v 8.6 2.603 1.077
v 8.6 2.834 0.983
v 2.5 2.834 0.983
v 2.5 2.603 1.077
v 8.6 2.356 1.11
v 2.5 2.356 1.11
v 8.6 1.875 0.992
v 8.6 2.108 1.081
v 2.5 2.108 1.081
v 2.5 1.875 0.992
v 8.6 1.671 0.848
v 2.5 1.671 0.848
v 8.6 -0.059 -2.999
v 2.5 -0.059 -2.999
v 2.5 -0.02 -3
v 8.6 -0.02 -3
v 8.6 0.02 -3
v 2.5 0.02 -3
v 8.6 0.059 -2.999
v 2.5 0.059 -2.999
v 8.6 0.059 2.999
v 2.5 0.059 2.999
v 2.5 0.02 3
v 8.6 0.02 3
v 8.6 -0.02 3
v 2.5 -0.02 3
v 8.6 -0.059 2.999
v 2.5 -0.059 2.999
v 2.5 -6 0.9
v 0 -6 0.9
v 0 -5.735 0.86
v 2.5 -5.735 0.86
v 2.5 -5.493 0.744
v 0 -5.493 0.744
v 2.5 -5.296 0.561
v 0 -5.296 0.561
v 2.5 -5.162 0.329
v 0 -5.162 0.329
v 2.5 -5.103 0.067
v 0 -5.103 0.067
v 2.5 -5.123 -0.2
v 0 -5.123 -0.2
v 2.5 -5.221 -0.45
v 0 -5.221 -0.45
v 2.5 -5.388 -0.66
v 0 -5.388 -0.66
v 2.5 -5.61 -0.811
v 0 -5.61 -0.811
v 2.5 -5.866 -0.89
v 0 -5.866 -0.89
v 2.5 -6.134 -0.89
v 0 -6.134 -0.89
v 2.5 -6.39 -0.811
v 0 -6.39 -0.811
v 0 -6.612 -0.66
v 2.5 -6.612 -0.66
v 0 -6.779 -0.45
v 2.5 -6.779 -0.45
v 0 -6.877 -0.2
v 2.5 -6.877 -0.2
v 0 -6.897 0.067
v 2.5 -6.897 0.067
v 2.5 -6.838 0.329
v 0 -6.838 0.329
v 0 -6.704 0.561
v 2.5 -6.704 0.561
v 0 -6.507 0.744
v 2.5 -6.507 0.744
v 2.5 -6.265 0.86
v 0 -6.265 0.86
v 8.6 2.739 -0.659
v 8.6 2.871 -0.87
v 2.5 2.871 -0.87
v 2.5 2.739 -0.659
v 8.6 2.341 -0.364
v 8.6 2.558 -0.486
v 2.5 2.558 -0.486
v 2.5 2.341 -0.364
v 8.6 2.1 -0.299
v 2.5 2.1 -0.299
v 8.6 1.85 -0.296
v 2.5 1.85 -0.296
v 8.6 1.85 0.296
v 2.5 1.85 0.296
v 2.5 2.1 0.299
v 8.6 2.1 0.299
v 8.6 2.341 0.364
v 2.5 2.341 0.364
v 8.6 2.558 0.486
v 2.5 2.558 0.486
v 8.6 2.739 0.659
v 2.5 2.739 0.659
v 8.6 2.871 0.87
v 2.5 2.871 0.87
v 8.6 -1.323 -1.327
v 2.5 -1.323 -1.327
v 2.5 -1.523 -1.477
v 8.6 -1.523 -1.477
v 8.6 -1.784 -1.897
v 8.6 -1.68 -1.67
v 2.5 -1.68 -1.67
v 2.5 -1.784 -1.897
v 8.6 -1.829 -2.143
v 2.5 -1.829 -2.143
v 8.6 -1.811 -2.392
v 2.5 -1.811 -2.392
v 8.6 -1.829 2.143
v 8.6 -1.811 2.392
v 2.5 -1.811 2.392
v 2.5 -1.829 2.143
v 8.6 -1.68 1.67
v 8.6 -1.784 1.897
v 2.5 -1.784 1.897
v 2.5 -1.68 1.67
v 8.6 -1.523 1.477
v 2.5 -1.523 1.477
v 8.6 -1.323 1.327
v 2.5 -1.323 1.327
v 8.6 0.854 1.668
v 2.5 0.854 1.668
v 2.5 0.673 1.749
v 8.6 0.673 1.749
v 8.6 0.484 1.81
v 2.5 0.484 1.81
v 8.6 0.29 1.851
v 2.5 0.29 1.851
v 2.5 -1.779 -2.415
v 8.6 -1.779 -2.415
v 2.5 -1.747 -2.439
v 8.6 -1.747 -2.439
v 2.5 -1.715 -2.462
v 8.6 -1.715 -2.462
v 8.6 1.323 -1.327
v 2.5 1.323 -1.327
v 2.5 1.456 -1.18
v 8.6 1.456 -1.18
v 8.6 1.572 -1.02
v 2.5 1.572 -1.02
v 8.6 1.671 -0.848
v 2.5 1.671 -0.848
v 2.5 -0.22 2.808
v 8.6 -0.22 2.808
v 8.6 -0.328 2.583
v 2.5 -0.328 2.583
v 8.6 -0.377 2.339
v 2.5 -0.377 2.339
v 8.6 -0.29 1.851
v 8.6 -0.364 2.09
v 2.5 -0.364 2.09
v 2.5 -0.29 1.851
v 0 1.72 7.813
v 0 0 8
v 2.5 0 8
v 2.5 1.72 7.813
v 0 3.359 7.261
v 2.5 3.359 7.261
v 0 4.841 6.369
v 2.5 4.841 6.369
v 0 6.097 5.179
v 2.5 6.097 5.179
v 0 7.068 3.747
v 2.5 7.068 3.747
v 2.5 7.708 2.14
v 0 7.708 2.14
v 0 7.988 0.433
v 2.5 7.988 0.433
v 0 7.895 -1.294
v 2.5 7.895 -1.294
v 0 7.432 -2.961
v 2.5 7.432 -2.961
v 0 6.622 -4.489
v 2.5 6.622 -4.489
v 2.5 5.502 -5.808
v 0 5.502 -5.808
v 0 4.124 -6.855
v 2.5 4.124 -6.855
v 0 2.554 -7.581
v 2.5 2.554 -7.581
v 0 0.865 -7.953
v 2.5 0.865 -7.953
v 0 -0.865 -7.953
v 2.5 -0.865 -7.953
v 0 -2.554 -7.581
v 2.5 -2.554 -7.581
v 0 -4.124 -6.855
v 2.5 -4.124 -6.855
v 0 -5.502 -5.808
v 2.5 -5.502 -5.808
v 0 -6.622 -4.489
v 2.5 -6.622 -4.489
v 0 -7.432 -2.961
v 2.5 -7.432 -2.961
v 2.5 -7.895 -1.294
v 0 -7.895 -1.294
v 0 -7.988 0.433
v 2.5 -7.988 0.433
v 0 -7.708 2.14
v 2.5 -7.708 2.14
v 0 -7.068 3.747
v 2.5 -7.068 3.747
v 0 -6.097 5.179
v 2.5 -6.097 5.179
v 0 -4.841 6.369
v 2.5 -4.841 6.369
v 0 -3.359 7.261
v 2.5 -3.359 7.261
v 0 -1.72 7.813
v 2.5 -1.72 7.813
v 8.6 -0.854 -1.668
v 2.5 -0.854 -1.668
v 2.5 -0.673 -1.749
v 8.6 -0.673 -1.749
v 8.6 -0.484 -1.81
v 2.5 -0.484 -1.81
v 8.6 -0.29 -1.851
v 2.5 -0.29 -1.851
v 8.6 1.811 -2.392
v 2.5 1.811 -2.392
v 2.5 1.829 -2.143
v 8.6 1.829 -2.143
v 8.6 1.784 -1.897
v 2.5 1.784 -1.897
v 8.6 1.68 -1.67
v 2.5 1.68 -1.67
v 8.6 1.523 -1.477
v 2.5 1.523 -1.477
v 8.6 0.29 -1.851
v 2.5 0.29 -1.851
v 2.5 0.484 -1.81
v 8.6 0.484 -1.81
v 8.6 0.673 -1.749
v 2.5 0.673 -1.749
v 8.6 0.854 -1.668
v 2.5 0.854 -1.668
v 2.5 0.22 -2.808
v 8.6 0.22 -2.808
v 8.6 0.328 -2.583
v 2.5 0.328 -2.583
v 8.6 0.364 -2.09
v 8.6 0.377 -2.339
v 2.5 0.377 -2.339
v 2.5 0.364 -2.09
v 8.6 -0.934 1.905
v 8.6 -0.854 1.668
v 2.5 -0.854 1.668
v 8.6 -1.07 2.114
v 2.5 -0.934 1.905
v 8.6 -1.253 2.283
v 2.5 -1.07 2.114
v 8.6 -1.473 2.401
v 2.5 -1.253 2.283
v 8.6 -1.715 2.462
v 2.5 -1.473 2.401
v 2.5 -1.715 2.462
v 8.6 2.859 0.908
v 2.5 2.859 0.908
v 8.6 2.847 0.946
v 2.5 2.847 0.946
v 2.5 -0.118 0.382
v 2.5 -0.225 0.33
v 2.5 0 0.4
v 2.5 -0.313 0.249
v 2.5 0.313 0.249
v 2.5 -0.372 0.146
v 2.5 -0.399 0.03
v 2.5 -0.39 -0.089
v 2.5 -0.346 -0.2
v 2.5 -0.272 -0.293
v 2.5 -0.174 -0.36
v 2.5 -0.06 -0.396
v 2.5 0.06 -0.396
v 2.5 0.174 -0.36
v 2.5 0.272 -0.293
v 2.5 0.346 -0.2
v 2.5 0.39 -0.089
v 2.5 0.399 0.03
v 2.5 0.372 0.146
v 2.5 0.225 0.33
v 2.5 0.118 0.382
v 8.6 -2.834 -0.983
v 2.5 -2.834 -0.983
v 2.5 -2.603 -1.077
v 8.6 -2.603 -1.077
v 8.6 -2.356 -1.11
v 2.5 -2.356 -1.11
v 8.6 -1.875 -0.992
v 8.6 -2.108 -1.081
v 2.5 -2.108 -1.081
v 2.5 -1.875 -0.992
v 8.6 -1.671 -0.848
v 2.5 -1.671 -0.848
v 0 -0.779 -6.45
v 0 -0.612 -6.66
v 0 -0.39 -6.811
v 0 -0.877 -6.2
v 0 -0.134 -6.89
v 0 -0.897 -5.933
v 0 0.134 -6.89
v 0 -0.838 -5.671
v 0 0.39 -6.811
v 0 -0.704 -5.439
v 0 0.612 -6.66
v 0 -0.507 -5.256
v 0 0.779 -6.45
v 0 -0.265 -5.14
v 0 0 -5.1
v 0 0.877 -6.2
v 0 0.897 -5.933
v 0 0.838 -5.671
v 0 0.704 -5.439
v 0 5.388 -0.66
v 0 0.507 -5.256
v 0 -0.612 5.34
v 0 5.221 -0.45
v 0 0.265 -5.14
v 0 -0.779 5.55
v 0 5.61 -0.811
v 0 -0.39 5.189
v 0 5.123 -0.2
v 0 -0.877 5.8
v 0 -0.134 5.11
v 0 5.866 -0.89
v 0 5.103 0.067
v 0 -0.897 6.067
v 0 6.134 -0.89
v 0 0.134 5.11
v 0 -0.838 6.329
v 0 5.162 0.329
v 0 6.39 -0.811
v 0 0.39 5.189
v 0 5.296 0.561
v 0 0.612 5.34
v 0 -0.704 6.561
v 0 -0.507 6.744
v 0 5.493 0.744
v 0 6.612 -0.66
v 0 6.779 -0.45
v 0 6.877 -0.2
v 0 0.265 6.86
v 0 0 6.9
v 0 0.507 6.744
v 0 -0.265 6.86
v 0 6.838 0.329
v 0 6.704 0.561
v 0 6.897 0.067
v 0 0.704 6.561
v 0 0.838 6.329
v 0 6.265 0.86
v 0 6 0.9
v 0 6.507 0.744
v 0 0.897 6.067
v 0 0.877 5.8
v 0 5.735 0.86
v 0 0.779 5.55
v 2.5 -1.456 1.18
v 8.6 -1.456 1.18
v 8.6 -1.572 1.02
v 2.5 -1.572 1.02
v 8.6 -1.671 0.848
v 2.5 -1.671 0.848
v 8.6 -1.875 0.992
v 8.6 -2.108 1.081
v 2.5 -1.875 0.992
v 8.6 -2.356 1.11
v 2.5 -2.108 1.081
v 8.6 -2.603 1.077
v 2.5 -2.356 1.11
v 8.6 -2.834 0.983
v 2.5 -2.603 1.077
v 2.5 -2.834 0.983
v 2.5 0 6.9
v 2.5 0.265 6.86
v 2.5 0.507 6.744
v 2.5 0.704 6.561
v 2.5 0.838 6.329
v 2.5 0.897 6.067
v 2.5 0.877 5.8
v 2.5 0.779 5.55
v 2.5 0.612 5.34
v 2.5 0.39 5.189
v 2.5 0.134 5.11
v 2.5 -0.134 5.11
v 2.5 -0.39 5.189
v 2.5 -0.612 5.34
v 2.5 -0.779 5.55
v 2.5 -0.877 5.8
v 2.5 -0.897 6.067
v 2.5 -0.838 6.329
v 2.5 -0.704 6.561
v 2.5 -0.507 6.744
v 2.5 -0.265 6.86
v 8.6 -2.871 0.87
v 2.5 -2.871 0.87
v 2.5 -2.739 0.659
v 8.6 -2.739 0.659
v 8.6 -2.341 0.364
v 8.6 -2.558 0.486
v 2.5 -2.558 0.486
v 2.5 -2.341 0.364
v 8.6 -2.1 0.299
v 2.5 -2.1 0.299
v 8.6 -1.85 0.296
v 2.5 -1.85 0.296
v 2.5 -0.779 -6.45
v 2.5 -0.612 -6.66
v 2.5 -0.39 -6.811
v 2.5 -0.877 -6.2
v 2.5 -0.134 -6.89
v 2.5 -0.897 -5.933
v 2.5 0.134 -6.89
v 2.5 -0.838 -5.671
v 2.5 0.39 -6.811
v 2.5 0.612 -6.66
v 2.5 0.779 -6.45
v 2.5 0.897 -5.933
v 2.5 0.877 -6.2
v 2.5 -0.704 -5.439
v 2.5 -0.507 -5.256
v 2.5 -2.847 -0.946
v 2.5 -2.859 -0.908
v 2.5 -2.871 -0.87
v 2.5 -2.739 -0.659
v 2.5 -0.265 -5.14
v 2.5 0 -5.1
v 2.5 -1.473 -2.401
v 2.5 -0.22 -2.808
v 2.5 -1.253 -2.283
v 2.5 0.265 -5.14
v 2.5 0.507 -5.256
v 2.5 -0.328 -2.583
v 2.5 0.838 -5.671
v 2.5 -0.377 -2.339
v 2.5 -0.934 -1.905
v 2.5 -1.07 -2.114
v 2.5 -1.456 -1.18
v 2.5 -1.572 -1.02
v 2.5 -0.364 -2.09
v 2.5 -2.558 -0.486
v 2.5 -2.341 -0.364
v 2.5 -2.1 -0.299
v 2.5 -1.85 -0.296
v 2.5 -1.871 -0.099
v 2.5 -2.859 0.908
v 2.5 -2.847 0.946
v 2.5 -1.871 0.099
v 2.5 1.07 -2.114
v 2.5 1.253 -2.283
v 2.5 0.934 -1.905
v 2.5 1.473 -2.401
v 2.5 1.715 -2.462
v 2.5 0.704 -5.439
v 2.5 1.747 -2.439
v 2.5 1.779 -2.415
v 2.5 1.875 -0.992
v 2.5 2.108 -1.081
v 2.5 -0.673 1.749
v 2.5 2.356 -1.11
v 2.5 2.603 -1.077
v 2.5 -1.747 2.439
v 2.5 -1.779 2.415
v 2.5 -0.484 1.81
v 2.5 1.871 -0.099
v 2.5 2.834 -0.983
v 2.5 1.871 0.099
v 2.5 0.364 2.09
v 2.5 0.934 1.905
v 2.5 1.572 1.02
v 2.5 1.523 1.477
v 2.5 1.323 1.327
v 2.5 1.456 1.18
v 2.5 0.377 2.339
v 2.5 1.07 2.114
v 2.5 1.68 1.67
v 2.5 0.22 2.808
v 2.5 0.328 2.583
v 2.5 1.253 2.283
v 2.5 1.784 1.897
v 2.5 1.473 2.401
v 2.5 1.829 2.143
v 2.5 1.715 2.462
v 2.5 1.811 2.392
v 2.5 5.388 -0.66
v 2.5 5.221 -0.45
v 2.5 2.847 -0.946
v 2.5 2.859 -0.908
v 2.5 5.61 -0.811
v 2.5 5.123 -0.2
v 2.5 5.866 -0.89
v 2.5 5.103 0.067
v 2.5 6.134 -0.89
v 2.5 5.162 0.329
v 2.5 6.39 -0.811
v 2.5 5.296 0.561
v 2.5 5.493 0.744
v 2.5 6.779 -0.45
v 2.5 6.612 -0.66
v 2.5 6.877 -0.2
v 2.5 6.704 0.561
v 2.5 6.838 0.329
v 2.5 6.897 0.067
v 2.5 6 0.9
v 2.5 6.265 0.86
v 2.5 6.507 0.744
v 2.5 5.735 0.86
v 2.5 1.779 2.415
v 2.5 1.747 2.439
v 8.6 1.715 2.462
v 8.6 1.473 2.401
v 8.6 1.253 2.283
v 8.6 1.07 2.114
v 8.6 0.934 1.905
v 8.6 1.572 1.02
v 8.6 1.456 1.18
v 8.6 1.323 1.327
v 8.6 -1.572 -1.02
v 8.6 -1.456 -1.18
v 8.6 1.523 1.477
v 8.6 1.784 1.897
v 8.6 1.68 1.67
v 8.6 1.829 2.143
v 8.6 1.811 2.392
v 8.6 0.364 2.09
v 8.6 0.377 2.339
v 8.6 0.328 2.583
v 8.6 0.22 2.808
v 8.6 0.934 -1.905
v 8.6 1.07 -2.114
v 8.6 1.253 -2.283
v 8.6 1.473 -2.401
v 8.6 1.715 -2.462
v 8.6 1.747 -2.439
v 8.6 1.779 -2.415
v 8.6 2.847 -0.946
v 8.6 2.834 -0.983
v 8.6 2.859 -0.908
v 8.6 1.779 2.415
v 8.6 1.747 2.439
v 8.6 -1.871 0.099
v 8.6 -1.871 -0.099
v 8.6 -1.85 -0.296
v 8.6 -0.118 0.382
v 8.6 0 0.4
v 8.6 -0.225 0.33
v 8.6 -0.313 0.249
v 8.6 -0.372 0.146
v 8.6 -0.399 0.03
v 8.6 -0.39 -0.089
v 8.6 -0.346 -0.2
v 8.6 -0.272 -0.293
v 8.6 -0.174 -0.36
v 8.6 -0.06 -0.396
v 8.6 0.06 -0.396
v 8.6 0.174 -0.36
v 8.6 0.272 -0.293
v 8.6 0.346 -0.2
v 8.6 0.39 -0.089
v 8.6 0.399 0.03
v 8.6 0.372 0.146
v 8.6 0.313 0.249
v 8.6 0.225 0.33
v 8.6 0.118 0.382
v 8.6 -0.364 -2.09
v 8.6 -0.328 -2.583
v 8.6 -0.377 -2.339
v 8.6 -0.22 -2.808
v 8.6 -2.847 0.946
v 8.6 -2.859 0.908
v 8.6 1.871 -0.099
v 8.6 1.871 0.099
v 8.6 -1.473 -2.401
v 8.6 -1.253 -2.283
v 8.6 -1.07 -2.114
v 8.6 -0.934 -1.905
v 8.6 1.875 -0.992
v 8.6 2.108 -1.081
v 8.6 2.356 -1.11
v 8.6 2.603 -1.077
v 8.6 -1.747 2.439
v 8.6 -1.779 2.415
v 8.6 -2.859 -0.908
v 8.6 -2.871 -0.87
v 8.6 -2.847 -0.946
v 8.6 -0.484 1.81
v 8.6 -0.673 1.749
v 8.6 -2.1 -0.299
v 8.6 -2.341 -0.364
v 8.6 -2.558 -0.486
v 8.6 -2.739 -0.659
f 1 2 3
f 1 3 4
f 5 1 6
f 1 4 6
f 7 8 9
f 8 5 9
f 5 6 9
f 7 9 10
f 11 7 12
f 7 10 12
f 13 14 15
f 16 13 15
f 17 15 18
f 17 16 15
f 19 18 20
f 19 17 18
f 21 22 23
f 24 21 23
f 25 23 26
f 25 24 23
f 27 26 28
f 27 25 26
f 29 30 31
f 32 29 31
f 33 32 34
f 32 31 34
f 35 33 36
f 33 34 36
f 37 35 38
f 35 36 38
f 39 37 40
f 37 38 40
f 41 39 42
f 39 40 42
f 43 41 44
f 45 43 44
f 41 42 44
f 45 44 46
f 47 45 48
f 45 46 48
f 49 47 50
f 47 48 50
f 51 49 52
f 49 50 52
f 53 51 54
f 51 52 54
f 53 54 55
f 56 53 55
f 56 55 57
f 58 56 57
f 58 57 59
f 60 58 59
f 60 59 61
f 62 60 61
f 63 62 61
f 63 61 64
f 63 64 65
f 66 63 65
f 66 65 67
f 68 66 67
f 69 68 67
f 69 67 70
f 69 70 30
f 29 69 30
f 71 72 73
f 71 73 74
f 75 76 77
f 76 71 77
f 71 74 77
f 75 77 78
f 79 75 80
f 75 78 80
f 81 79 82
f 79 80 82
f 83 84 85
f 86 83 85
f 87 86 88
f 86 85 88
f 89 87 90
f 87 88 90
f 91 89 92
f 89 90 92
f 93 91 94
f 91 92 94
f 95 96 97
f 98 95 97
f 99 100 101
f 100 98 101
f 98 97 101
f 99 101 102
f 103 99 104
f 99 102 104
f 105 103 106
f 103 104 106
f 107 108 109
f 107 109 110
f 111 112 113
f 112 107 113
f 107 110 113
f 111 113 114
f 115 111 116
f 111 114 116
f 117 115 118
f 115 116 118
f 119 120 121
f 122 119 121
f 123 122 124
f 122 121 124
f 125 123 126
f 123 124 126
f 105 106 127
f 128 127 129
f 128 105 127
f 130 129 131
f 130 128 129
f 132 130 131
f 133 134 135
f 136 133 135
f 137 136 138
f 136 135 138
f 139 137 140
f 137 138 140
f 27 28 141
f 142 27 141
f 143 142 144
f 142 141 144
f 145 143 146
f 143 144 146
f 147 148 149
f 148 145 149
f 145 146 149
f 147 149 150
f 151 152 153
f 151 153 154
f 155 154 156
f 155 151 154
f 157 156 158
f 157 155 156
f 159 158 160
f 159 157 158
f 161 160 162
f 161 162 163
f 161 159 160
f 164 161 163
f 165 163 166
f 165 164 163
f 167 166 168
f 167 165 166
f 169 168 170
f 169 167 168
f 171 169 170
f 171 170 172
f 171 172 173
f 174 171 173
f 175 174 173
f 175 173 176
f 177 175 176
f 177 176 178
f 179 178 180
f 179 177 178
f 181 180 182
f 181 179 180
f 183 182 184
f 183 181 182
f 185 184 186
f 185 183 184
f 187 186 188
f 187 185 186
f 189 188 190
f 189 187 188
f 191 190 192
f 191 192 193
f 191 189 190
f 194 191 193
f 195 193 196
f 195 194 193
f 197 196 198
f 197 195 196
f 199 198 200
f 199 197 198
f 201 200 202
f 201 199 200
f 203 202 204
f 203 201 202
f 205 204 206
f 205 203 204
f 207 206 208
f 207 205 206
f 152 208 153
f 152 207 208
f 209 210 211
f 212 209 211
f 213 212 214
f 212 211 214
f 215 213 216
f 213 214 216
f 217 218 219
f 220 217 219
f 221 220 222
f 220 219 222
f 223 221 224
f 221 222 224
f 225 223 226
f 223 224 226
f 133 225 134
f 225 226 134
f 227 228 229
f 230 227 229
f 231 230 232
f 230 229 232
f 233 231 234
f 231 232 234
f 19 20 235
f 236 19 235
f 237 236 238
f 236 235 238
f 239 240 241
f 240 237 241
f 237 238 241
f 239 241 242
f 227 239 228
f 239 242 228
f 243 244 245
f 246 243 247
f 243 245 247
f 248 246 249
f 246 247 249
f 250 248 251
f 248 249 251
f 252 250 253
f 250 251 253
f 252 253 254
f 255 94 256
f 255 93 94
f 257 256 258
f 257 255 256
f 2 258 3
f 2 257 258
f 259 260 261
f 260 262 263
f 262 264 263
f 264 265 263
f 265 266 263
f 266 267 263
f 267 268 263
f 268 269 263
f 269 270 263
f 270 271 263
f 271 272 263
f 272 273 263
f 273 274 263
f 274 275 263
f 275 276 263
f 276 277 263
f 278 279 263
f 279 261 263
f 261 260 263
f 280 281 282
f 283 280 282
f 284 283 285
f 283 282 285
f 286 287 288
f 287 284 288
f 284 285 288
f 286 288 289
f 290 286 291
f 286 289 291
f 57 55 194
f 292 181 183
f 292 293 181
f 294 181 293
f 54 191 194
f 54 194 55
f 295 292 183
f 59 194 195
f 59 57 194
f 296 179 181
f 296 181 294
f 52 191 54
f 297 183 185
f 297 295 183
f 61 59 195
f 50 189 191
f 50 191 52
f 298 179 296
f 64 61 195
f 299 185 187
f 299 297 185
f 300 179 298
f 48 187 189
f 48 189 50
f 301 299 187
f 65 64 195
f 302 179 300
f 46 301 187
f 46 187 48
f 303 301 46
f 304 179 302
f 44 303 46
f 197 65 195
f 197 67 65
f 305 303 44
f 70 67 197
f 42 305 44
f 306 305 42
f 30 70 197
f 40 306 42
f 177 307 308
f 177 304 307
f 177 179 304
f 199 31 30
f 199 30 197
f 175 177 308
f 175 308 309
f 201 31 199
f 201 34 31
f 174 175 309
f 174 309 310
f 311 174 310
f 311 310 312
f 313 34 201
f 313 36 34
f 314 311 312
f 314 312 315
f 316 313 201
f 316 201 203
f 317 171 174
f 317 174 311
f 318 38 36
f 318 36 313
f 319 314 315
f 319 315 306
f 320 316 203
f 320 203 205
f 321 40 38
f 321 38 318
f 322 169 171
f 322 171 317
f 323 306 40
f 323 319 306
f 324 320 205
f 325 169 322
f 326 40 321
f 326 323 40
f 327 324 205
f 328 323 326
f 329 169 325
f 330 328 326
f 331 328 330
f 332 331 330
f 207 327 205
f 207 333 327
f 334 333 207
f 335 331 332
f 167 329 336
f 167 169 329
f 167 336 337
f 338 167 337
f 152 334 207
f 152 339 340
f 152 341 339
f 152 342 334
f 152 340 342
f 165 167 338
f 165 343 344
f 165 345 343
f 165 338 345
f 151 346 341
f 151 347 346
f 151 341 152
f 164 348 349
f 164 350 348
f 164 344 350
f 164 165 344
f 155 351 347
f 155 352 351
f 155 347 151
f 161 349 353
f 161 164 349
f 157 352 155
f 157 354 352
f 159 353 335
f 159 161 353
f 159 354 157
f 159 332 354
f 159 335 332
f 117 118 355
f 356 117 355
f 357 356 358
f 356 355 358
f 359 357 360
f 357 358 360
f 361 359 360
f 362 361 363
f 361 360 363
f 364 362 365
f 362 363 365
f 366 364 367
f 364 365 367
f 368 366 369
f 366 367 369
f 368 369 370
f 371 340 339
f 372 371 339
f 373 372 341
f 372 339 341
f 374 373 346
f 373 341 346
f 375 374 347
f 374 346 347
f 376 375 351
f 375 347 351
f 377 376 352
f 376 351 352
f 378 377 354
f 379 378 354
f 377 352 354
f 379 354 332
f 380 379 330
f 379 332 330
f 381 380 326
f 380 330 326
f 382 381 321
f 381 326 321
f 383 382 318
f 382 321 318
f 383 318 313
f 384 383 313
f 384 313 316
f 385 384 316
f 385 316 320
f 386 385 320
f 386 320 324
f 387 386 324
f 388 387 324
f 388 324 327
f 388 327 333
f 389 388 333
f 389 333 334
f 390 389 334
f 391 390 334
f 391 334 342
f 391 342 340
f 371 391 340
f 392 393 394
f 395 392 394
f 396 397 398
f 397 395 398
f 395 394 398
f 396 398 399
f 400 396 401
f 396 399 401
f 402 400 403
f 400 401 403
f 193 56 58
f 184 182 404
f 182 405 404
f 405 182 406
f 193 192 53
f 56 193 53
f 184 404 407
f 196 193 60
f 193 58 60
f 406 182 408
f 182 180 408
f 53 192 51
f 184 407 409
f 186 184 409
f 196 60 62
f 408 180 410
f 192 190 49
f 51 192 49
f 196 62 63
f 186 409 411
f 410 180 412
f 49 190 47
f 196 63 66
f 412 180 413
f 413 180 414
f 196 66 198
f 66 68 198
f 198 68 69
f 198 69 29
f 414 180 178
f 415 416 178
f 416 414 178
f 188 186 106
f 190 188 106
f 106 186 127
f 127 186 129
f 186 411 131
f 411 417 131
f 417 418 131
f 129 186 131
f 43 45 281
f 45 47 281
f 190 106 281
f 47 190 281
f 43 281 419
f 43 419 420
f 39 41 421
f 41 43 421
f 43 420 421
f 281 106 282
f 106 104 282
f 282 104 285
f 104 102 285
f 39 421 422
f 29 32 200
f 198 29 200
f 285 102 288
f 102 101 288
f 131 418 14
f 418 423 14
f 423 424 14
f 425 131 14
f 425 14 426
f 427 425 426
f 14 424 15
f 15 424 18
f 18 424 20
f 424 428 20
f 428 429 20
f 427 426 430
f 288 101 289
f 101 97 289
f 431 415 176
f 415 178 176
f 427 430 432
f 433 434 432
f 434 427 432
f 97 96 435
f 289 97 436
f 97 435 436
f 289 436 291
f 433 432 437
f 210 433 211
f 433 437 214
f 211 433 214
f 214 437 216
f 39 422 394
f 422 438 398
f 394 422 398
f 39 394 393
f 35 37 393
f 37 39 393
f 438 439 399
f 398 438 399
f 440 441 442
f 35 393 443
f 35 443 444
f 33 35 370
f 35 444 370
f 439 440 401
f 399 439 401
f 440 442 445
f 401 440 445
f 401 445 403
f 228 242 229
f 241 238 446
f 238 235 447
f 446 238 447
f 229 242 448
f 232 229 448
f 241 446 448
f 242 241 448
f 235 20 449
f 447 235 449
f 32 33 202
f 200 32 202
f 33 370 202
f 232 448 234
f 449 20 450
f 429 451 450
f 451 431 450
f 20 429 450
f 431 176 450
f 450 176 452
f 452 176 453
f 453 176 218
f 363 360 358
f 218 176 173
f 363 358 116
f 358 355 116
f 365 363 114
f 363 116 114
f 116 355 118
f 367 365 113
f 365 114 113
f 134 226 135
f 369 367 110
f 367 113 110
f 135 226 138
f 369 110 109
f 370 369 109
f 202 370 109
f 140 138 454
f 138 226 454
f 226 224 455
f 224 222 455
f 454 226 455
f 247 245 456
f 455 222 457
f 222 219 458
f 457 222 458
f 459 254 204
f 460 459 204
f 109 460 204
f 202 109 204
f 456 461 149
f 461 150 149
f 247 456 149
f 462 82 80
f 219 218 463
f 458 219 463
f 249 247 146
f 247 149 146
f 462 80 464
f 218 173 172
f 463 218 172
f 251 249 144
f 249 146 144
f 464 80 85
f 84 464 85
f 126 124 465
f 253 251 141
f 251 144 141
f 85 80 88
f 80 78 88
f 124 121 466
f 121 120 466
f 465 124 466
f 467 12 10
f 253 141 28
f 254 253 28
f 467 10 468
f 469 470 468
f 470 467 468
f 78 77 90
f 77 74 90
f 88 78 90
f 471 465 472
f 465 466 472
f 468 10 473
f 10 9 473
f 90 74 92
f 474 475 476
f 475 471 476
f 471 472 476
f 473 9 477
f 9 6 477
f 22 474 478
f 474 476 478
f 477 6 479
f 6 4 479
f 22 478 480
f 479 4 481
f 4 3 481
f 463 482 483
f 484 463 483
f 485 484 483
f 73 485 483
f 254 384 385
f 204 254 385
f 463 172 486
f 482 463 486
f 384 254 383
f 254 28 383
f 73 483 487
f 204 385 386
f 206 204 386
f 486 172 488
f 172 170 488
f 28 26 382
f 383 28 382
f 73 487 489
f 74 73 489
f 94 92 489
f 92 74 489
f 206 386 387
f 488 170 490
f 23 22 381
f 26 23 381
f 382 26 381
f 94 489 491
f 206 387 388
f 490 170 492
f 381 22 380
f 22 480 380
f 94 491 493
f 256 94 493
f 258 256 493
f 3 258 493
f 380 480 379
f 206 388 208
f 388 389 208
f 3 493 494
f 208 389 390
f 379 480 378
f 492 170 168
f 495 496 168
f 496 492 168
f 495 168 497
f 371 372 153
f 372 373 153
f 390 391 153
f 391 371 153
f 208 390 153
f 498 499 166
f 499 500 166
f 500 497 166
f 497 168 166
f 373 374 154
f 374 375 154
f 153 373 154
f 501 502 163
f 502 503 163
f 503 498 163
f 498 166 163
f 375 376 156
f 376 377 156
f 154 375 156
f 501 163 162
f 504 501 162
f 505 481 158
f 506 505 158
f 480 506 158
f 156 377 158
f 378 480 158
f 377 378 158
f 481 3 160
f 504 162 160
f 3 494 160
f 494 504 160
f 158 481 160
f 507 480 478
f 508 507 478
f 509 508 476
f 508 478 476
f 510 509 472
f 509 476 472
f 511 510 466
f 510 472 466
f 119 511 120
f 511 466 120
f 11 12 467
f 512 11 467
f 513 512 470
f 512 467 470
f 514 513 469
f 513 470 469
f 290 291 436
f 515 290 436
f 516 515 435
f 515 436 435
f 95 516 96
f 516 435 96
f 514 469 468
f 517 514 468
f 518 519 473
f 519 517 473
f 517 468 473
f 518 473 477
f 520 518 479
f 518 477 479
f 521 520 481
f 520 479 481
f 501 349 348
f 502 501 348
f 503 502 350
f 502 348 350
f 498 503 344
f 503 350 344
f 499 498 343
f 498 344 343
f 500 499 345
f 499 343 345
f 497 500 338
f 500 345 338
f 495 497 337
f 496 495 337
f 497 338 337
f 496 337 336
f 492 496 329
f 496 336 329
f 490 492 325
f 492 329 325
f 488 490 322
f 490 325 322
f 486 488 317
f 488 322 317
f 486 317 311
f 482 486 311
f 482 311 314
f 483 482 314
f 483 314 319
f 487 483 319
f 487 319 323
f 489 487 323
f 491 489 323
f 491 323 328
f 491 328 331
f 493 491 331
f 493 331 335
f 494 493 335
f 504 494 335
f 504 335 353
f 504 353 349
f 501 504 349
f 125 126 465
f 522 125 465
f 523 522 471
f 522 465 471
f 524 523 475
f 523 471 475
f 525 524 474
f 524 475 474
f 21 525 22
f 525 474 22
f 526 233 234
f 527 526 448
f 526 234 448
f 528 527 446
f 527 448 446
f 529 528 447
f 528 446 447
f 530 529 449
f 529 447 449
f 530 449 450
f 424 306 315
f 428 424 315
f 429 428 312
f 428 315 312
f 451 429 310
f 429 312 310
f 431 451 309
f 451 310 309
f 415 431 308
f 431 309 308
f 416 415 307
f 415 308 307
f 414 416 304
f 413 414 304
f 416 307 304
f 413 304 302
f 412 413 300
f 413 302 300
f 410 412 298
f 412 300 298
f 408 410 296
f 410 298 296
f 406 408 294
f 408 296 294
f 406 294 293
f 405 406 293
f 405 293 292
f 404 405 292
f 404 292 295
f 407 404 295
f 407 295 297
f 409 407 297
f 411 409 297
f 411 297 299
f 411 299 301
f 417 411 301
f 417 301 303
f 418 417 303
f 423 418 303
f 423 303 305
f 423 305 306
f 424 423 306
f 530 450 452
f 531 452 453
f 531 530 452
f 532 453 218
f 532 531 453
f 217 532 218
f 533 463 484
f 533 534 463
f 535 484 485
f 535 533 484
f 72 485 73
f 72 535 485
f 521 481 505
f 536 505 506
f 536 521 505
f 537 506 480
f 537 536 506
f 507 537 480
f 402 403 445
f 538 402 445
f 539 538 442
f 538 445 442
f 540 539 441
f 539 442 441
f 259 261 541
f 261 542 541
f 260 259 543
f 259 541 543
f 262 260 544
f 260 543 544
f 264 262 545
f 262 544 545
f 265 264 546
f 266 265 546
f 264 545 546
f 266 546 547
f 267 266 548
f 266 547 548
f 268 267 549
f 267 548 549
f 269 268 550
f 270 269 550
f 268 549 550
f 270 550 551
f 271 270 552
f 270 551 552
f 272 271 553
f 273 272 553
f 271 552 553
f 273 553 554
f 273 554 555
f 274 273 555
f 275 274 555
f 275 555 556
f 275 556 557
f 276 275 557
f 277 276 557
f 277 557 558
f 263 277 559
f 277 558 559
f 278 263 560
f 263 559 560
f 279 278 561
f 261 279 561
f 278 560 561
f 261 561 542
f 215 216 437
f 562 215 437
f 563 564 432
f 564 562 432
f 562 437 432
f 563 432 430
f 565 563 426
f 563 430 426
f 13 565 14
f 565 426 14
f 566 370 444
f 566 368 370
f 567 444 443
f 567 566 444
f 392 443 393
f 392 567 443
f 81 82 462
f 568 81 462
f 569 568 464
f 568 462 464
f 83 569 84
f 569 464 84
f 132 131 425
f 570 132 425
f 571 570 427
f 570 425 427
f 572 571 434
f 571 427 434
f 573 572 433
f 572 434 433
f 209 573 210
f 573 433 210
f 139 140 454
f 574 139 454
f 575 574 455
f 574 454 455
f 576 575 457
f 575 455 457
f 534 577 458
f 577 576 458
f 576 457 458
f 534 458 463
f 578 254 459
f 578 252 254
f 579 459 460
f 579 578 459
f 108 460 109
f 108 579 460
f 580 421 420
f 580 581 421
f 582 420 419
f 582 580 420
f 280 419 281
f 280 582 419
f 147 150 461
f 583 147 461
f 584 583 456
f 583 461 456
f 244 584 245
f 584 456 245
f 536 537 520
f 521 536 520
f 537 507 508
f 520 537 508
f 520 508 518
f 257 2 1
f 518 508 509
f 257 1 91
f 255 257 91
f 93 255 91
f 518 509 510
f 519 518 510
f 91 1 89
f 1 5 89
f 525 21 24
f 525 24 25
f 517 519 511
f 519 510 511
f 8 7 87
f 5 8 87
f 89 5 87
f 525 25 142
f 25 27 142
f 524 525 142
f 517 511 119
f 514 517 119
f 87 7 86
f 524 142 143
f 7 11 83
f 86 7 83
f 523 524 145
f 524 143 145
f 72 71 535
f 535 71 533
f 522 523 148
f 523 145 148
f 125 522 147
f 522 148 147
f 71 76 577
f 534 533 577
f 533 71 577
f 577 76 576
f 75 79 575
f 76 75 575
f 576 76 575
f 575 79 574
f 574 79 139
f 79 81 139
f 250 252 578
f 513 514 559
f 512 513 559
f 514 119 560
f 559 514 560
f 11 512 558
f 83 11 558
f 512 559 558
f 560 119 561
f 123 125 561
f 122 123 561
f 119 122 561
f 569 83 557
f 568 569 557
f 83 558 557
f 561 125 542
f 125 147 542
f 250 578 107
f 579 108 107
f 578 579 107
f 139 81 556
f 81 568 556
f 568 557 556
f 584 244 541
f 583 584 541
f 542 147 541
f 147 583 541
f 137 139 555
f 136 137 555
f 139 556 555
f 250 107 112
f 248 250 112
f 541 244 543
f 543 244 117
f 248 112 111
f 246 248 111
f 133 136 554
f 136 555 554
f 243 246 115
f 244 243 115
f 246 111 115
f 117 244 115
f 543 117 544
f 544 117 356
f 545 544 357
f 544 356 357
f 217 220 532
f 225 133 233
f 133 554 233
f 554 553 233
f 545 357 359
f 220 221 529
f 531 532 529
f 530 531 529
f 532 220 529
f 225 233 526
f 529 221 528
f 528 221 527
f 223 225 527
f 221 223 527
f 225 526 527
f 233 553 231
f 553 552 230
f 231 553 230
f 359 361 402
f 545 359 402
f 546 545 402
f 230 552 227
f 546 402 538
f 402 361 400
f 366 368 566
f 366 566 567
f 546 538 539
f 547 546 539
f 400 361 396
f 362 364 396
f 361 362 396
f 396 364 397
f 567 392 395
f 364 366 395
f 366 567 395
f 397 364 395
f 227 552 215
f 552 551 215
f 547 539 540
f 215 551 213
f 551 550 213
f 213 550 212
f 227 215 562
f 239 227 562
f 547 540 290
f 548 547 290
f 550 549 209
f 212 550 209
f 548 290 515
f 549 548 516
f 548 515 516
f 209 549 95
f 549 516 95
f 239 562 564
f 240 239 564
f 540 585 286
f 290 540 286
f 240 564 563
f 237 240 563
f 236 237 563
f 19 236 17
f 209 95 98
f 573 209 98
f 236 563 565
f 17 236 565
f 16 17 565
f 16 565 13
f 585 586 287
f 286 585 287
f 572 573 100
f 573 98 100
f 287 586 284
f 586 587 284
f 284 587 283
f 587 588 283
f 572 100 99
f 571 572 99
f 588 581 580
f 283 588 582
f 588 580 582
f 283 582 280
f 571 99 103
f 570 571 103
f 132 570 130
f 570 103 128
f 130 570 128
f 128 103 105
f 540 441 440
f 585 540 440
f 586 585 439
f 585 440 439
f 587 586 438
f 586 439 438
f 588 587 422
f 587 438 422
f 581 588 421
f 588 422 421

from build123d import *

# Parameters (mm, degrees)
BASPROSKE_W                = 8.6
BASPROSKE_H                = 3
TOOTHCUT_DEPTH             = 10.589577676
TEETHCUTS_COUNT            = 10
BORSKE_R                   = 0.4
BORE_DEPTH                 = 50.0000508
SKETCH1_R                  = 8
BOSS_EXTRUDE1_DEPTH        = 2.5
M1_6_CLEARANCE_HOLE1_D     = 1.8
M1_6_CLEARANCE_HOLE1_DEPTH = 4.25
M1_6_CLEARANCE_HOLE1_TIP   = 0.540774557


with BuildPart() as part:
    # BasProSke → Base-Revolve (revolve)
    with BuildSketch(Plane(origin=(0, 0, 0), x_dir=(1, 0, 0), z_dir=(0, 1, 0)), mode=Mode.PRIVATE) as base_revolve_sk:
        with Locations((4.3, 1.5)):
            Rectangle(BASPROSKE_W, BASPROSKE_H)
    revolve(base_revolve_sk.sketch.rotate(Axis((-10, 0, 0), (1, 0, 0)), 180), axis=Axis((-10, 0, 0), (1, 0, 0)))

    # TooCutSke → ToothCut (cut, through all)
    with BuildSketch(Plane(origin=(0, 0, 0), x_dir=(0, 0, -1), z_dir=(1, 0, 0))):
        with BuildLine():
            ThreePointArc((0.296449938, 1.850403587), (0, 1.874), (-0.296449938, 1.850403587))
            ThreePointArc((-0.296449938, 1.850403587), (-0.428089565, 2.470295585), (-0.905889751, 2.886591228))
            ThreePointArc((-0.905889751, 2.886591228), (0, 3.0254), (0.905889751, 2.886591228))
            ThreePointArc((0.905889751, 2.886591228), (0.428089565, 2.470295585), (0.296449938, 1.850403587))
        make_face()
    toothcut = extrude(amount=TOOTHCUT_DEPTH, mode=Mode.SUBTRACT)

    # TeethCuts: ToothCut ×10 about axis
    teethcuts_axis = Axis((0, 0, 0), (1, 0, 0))
    for i in range(1, TEETHCUTS_COUNT):
        add(toothcut.rotate(teethcuts_axis, i * 360 / TEETHCUTS_COUNT), mode=Mode.SUBTRACT)

    # BorSke → Bore (cut, symmetric)
    with BuildSketch(Plane(origin=(0, 0, 0), x_dir=(0, 0, -1), z_dir=(1, 0, 0))):
        with Locations(Location((0, 0, 0), (0, 0, 180))):
            Circle(BORSKE_R)
    extrude(amount=BORE_DEPTH, both=True, mode=Mode.SUBTRACT)

    # Sketch1 → Boss-Extrude1 (add)
    with BuildSketch(Plane.ZY):
        Circle(SKETCH1_R)
    extrude(amount=-BOSS_EXTRUDE1_DEPTH)

    # M1.6 Clearance Hole1
    with Locations(Plane(origin=(2.5, 0, 0), x_dir=(0, 0, -1), z_dir=(1, 0, 0))):
        with Locations((0, 6), (6, 0), (0, -6), (-6, 0)):
            Hole(M1_6_CLEARANCE_HOLE1_D / 2, depth=M1_6_CLEARANCE_HOLE1_DEPTH)
            with Locations((0, 0, -(M1_6_CLEARANCE_HOLE1_DEPTH + M1_6_CLEARANCE_HOLE1_TIP / 2))):  # 118° drill point
                Cone(0, M1_6_CLEARANCE_HOLE1_D / 2, M1_6_CLEARANCE_HOLE1_TIP, mode=Mode.SUBTRACT)


solid = part.part
